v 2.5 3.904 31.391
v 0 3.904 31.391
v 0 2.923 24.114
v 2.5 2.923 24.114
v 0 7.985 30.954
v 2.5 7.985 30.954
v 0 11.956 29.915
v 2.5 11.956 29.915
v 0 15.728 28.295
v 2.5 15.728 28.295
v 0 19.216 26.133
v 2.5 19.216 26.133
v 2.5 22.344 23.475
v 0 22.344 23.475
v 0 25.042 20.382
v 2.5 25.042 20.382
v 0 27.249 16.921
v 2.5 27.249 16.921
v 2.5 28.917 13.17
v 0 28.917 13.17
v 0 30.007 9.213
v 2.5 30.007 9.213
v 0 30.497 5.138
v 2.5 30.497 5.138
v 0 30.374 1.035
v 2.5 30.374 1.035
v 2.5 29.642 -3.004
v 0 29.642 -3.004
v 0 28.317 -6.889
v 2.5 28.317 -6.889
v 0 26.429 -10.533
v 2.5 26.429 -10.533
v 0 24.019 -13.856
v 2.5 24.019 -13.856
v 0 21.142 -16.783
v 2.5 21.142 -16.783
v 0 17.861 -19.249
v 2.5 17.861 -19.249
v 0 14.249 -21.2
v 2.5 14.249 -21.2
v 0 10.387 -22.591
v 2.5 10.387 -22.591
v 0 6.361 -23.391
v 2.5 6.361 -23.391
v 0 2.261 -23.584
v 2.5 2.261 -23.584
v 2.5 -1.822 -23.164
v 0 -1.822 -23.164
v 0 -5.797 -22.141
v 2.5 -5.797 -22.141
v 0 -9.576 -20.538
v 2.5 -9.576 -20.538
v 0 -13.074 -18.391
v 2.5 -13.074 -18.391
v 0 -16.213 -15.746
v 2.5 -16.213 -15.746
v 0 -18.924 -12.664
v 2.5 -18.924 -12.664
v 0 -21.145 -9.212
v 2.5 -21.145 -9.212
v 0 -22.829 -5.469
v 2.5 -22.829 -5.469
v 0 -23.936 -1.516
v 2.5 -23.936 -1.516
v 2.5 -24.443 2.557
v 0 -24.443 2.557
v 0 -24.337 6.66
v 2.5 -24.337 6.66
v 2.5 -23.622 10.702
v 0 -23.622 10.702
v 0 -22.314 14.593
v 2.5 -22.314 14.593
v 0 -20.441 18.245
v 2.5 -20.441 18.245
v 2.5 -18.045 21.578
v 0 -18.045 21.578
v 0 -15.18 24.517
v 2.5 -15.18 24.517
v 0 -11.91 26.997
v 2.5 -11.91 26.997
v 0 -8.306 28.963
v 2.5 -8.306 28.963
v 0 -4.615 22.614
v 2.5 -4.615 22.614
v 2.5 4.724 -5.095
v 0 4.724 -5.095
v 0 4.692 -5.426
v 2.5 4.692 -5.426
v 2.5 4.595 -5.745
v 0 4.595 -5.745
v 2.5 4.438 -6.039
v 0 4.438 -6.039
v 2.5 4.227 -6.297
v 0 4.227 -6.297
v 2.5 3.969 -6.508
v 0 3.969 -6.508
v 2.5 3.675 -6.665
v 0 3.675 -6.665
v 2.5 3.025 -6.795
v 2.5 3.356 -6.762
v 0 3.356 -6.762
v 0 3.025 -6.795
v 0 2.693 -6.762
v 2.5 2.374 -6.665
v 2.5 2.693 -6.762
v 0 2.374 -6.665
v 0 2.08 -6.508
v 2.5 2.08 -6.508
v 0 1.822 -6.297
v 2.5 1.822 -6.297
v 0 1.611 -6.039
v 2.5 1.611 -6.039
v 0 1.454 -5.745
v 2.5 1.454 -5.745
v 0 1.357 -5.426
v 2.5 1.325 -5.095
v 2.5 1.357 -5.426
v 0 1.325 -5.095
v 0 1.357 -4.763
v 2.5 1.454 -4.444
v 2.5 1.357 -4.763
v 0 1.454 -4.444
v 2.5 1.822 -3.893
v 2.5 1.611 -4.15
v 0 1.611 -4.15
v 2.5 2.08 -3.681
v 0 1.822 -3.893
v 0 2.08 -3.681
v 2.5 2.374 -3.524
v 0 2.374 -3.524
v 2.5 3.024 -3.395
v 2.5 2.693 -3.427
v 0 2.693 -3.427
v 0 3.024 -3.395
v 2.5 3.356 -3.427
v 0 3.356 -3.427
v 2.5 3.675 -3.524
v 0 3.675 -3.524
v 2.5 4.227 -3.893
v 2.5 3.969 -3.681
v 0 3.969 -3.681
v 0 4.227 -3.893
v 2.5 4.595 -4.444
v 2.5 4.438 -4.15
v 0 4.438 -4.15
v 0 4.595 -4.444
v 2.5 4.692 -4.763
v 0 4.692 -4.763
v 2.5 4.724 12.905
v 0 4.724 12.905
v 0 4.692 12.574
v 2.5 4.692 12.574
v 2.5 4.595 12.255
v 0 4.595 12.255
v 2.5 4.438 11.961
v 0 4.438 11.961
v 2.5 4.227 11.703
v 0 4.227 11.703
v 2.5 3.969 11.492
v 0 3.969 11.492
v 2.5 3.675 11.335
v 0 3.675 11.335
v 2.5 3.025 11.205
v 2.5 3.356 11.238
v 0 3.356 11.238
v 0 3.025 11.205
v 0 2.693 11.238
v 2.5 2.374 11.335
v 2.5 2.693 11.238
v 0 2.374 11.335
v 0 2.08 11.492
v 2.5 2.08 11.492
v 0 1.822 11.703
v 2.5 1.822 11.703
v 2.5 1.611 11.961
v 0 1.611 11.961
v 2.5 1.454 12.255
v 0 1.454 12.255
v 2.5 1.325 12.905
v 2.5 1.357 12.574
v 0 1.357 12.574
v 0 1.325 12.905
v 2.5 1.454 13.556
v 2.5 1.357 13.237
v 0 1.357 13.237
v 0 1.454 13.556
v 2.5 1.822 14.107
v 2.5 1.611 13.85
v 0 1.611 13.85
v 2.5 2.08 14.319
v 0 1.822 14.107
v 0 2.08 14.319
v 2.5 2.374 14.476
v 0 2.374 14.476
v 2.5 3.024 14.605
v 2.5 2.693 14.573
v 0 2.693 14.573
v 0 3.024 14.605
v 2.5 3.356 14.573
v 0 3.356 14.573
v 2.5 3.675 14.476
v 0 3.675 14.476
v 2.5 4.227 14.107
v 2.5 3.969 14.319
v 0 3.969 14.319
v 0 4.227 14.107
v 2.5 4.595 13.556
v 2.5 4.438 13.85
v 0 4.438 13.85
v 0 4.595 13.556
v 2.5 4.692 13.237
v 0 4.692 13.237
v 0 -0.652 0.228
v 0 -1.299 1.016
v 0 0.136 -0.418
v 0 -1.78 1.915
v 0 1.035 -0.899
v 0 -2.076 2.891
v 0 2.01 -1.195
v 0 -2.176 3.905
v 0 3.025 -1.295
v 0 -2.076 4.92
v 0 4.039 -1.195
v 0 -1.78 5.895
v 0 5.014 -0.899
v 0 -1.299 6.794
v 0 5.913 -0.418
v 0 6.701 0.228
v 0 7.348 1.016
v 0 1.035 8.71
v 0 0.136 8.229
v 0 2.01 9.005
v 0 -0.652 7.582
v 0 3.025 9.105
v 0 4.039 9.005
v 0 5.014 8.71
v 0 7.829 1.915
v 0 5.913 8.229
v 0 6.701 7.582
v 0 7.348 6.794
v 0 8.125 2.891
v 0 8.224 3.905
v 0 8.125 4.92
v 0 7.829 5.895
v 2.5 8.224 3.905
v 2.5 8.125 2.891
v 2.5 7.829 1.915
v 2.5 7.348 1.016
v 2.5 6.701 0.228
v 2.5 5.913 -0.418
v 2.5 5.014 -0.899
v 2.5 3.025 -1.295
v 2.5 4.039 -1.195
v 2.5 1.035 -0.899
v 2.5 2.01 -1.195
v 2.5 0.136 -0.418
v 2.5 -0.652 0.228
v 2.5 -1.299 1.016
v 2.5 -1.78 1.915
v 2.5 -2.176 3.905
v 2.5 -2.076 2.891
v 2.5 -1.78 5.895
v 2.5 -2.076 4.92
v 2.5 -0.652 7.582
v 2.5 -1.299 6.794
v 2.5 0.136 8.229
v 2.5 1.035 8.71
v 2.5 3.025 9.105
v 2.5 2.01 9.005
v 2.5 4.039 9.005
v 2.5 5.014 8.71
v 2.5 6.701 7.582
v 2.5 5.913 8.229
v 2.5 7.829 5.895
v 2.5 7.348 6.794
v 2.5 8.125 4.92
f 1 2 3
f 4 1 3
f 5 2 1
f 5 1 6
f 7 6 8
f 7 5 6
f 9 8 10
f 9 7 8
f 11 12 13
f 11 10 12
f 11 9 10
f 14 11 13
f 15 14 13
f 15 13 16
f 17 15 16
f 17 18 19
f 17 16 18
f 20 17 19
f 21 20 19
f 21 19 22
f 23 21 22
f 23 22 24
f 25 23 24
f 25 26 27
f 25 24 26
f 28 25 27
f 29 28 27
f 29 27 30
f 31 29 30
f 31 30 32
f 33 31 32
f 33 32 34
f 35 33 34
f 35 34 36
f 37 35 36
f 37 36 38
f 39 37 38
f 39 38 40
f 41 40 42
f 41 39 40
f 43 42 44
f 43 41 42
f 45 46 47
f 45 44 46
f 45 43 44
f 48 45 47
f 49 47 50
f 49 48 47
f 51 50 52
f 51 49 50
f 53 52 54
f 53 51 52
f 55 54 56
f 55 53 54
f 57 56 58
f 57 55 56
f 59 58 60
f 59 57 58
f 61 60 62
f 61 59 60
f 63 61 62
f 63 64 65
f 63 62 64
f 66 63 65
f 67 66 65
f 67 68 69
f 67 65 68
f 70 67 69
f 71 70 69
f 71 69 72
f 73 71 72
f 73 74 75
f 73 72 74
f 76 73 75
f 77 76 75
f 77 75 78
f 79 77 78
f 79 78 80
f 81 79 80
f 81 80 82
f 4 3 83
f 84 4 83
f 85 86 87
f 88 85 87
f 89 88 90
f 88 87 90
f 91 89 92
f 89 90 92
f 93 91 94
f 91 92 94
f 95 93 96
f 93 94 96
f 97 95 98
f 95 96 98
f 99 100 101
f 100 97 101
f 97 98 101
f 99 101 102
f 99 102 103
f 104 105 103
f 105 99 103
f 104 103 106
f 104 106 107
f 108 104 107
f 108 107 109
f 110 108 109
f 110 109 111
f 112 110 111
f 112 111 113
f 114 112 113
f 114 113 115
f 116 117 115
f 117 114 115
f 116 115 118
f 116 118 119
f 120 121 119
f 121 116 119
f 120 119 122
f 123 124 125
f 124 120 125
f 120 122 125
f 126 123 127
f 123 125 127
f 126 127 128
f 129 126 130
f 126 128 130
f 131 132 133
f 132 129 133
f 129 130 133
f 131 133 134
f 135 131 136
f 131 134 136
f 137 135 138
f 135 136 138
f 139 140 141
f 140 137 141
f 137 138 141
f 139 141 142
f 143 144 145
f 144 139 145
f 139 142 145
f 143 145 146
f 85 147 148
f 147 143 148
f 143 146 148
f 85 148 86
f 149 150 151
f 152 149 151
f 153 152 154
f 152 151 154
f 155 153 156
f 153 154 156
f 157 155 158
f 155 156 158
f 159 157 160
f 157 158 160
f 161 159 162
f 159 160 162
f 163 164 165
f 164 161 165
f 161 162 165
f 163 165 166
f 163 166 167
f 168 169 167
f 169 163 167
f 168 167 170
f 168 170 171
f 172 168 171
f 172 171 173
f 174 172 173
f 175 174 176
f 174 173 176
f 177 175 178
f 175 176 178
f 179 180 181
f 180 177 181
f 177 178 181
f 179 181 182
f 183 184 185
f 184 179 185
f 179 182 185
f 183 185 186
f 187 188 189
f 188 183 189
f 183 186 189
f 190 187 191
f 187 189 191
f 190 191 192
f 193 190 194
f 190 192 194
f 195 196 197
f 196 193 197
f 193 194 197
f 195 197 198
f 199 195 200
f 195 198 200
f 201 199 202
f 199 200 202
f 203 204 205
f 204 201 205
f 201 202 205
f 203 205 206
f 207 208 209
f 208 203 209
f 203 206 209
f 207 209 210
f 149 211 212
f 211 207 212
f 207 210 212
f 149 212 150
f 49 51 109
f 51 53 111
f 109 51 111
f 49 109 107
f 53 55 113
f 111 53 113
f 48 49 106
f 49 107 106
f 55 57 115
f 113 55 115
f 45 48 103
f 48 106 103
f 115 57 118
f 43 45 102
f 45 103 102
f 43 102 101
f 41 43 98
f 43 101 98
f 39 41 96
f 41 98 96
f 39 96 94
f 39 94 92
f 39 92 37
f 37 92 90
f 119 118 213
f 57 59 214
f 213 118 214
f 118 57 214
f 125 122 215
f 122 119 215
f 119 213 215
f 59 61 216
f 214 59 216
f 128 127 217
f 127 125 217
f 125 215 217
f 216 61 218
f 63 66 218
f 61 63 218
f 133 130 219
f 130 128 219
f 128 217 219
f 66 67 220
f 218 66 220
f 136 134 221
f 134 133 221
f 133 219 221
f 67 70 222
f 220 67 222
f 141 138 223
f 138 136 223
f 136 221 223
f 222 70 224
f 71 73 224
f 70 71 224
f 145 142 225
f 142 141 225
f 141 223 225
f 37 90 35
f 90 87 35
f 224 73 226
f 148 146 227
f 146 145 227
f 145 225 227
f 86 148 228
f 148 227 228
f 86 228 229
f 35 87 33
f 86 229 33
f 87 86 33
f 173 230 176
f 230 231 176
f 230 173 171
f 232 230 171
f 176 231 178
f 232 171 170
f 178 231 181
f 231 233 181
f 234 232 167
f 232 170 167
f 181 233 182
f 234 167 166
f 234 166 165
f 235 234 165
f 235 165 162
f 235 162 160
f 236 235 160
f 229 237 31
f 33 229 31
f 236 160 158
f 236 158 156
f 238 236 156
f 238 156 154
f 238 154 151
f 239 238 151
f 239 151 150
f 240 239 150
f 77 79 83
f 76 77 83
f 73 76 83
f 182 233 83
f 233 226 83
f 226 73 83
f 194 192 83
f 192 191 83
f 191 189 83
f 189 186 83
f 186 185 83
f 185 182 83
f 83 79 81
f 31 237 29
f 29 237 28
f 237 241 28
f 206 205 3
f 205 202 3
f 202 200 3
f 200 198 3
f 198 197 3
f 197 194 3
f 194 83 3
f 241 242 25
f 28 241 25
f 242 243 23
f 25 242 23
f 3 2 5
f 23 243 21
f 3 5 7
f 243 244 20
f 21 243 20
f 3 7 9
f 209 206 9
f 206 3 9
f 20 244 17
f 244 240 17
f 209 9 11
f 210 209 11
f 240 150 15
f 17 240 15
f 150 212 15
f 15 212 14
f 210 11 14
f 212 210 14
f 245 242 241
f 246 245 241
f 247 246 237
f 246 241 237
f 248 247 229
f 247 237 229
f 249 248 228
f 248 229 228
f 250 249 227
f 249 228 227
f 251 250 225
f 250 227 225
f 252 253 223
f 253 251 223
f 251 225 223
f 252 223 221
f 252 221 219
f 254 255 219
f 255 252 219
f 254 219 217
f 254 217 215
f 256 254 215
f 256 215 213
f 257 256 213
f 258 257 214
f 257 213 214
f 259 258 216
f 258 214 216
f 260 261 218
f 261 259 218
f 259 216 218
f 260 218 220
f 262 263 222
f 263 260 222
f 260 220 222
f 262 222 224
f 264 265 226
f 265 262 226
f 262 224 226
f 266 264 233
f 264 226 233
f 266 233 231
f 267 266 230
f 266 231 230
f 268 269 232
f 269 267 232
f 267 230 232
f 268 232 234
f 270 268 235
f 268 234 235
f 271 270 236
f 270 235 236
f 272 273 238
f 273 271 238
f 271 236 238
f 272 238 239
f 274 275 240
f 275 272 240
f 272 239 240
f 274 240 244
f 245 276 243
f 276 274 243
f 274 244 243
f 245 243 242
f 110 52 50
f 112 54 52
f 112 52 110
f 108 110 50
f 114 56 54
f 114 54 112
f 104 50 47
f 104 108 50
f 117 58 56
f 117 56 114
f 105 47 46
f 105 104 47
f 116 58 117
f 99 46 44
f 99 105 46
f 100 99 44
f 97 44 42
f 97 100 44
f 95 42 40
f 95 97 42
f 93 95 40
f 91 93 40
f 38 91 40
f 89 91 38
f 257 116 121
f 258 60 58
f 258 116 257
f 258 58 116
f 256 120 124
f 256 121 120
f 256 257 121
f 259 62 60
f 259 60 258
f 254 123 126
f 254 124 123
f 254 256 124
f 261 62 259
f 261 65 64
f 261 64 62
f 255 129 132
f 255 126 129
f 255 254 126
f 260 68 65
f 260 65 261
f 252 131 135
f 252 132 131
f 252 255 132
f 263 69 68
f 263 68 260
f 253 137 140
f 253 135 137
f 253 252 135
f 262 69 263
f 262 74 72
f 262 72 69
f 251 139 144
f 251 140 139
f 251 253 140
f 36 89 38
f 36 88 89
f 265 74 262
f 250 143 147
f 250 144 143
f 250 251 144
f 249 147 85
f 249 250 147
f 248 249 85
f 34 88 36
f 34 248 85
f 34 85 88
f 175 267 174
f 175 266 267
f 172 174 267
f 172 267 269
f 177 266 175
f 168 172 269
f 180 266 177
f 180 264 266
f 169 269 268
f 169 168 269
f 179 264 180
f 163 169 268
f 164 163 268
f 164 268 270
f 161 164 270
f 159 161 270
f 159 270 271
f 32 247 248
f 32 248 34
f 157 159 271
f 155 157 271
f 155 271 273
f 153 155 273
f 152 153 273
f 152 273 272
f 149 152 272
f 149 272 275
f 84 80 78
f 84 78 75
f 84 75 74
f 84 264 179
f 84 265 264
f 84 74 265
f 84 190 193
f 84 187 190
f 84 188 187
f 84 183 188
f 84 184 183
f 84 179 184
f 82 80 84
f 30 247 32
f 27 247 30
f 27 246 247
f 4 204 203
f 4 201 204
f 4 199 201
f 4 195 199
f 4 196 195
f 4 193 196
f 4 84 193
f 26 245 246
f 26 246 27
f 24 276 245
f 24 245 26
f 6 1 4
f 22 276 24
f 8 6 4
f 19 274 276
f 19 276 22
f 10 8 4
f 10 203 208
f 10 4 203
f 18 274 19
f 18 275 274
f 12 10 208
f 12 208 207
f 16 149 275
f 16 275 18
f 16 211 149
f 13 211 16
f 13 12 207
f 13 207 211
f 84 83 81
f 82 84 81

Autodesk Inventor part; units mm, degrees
ref_plane "YZ Plane" through (0, 0, 0) normal (1, 0, 0) x (0, 1, 0)
ref_plane "XZ Plane" through (0, 0, 0) normal (0, 1, 0) x (-1, 0, 0)
ref_plane "XY Plane" through (0, 0, 0) normal (0, 0, 1) x (1, 0, 0)
sketch "スケッチ1" plane through (0, 0, 0) normal (1, 0, 0) x (0, 1, 0)
  line L0 (-4.615, 22.6143) -> (-8.3061, 28.9627)
  arc A0 (-8.3061, 28.9627) -> (3.9037, 31.3913) centre (3.0245, 3.9054) ccw
  line L1 (3.9037, 31.3913) -> (2.923, 24.1137)
  line L2 (2.923, 24.1137) -> (-4.615, 22.6143)
  circle A1 centre (3.0245, -5.0946) radius 1.7
  circle A2 centre (3.0245, 12.9054) radius 1.7
  circle A3 centre (3.0245, 3.9054) radius 5.2
  point P0 (0, 0)
extrude "押し出し1" add sketch "スケッチ1" along normal blind 2.5
properties part number "belt_liner_v1_3DP_P_F-1" material "ABS プラスチック"
